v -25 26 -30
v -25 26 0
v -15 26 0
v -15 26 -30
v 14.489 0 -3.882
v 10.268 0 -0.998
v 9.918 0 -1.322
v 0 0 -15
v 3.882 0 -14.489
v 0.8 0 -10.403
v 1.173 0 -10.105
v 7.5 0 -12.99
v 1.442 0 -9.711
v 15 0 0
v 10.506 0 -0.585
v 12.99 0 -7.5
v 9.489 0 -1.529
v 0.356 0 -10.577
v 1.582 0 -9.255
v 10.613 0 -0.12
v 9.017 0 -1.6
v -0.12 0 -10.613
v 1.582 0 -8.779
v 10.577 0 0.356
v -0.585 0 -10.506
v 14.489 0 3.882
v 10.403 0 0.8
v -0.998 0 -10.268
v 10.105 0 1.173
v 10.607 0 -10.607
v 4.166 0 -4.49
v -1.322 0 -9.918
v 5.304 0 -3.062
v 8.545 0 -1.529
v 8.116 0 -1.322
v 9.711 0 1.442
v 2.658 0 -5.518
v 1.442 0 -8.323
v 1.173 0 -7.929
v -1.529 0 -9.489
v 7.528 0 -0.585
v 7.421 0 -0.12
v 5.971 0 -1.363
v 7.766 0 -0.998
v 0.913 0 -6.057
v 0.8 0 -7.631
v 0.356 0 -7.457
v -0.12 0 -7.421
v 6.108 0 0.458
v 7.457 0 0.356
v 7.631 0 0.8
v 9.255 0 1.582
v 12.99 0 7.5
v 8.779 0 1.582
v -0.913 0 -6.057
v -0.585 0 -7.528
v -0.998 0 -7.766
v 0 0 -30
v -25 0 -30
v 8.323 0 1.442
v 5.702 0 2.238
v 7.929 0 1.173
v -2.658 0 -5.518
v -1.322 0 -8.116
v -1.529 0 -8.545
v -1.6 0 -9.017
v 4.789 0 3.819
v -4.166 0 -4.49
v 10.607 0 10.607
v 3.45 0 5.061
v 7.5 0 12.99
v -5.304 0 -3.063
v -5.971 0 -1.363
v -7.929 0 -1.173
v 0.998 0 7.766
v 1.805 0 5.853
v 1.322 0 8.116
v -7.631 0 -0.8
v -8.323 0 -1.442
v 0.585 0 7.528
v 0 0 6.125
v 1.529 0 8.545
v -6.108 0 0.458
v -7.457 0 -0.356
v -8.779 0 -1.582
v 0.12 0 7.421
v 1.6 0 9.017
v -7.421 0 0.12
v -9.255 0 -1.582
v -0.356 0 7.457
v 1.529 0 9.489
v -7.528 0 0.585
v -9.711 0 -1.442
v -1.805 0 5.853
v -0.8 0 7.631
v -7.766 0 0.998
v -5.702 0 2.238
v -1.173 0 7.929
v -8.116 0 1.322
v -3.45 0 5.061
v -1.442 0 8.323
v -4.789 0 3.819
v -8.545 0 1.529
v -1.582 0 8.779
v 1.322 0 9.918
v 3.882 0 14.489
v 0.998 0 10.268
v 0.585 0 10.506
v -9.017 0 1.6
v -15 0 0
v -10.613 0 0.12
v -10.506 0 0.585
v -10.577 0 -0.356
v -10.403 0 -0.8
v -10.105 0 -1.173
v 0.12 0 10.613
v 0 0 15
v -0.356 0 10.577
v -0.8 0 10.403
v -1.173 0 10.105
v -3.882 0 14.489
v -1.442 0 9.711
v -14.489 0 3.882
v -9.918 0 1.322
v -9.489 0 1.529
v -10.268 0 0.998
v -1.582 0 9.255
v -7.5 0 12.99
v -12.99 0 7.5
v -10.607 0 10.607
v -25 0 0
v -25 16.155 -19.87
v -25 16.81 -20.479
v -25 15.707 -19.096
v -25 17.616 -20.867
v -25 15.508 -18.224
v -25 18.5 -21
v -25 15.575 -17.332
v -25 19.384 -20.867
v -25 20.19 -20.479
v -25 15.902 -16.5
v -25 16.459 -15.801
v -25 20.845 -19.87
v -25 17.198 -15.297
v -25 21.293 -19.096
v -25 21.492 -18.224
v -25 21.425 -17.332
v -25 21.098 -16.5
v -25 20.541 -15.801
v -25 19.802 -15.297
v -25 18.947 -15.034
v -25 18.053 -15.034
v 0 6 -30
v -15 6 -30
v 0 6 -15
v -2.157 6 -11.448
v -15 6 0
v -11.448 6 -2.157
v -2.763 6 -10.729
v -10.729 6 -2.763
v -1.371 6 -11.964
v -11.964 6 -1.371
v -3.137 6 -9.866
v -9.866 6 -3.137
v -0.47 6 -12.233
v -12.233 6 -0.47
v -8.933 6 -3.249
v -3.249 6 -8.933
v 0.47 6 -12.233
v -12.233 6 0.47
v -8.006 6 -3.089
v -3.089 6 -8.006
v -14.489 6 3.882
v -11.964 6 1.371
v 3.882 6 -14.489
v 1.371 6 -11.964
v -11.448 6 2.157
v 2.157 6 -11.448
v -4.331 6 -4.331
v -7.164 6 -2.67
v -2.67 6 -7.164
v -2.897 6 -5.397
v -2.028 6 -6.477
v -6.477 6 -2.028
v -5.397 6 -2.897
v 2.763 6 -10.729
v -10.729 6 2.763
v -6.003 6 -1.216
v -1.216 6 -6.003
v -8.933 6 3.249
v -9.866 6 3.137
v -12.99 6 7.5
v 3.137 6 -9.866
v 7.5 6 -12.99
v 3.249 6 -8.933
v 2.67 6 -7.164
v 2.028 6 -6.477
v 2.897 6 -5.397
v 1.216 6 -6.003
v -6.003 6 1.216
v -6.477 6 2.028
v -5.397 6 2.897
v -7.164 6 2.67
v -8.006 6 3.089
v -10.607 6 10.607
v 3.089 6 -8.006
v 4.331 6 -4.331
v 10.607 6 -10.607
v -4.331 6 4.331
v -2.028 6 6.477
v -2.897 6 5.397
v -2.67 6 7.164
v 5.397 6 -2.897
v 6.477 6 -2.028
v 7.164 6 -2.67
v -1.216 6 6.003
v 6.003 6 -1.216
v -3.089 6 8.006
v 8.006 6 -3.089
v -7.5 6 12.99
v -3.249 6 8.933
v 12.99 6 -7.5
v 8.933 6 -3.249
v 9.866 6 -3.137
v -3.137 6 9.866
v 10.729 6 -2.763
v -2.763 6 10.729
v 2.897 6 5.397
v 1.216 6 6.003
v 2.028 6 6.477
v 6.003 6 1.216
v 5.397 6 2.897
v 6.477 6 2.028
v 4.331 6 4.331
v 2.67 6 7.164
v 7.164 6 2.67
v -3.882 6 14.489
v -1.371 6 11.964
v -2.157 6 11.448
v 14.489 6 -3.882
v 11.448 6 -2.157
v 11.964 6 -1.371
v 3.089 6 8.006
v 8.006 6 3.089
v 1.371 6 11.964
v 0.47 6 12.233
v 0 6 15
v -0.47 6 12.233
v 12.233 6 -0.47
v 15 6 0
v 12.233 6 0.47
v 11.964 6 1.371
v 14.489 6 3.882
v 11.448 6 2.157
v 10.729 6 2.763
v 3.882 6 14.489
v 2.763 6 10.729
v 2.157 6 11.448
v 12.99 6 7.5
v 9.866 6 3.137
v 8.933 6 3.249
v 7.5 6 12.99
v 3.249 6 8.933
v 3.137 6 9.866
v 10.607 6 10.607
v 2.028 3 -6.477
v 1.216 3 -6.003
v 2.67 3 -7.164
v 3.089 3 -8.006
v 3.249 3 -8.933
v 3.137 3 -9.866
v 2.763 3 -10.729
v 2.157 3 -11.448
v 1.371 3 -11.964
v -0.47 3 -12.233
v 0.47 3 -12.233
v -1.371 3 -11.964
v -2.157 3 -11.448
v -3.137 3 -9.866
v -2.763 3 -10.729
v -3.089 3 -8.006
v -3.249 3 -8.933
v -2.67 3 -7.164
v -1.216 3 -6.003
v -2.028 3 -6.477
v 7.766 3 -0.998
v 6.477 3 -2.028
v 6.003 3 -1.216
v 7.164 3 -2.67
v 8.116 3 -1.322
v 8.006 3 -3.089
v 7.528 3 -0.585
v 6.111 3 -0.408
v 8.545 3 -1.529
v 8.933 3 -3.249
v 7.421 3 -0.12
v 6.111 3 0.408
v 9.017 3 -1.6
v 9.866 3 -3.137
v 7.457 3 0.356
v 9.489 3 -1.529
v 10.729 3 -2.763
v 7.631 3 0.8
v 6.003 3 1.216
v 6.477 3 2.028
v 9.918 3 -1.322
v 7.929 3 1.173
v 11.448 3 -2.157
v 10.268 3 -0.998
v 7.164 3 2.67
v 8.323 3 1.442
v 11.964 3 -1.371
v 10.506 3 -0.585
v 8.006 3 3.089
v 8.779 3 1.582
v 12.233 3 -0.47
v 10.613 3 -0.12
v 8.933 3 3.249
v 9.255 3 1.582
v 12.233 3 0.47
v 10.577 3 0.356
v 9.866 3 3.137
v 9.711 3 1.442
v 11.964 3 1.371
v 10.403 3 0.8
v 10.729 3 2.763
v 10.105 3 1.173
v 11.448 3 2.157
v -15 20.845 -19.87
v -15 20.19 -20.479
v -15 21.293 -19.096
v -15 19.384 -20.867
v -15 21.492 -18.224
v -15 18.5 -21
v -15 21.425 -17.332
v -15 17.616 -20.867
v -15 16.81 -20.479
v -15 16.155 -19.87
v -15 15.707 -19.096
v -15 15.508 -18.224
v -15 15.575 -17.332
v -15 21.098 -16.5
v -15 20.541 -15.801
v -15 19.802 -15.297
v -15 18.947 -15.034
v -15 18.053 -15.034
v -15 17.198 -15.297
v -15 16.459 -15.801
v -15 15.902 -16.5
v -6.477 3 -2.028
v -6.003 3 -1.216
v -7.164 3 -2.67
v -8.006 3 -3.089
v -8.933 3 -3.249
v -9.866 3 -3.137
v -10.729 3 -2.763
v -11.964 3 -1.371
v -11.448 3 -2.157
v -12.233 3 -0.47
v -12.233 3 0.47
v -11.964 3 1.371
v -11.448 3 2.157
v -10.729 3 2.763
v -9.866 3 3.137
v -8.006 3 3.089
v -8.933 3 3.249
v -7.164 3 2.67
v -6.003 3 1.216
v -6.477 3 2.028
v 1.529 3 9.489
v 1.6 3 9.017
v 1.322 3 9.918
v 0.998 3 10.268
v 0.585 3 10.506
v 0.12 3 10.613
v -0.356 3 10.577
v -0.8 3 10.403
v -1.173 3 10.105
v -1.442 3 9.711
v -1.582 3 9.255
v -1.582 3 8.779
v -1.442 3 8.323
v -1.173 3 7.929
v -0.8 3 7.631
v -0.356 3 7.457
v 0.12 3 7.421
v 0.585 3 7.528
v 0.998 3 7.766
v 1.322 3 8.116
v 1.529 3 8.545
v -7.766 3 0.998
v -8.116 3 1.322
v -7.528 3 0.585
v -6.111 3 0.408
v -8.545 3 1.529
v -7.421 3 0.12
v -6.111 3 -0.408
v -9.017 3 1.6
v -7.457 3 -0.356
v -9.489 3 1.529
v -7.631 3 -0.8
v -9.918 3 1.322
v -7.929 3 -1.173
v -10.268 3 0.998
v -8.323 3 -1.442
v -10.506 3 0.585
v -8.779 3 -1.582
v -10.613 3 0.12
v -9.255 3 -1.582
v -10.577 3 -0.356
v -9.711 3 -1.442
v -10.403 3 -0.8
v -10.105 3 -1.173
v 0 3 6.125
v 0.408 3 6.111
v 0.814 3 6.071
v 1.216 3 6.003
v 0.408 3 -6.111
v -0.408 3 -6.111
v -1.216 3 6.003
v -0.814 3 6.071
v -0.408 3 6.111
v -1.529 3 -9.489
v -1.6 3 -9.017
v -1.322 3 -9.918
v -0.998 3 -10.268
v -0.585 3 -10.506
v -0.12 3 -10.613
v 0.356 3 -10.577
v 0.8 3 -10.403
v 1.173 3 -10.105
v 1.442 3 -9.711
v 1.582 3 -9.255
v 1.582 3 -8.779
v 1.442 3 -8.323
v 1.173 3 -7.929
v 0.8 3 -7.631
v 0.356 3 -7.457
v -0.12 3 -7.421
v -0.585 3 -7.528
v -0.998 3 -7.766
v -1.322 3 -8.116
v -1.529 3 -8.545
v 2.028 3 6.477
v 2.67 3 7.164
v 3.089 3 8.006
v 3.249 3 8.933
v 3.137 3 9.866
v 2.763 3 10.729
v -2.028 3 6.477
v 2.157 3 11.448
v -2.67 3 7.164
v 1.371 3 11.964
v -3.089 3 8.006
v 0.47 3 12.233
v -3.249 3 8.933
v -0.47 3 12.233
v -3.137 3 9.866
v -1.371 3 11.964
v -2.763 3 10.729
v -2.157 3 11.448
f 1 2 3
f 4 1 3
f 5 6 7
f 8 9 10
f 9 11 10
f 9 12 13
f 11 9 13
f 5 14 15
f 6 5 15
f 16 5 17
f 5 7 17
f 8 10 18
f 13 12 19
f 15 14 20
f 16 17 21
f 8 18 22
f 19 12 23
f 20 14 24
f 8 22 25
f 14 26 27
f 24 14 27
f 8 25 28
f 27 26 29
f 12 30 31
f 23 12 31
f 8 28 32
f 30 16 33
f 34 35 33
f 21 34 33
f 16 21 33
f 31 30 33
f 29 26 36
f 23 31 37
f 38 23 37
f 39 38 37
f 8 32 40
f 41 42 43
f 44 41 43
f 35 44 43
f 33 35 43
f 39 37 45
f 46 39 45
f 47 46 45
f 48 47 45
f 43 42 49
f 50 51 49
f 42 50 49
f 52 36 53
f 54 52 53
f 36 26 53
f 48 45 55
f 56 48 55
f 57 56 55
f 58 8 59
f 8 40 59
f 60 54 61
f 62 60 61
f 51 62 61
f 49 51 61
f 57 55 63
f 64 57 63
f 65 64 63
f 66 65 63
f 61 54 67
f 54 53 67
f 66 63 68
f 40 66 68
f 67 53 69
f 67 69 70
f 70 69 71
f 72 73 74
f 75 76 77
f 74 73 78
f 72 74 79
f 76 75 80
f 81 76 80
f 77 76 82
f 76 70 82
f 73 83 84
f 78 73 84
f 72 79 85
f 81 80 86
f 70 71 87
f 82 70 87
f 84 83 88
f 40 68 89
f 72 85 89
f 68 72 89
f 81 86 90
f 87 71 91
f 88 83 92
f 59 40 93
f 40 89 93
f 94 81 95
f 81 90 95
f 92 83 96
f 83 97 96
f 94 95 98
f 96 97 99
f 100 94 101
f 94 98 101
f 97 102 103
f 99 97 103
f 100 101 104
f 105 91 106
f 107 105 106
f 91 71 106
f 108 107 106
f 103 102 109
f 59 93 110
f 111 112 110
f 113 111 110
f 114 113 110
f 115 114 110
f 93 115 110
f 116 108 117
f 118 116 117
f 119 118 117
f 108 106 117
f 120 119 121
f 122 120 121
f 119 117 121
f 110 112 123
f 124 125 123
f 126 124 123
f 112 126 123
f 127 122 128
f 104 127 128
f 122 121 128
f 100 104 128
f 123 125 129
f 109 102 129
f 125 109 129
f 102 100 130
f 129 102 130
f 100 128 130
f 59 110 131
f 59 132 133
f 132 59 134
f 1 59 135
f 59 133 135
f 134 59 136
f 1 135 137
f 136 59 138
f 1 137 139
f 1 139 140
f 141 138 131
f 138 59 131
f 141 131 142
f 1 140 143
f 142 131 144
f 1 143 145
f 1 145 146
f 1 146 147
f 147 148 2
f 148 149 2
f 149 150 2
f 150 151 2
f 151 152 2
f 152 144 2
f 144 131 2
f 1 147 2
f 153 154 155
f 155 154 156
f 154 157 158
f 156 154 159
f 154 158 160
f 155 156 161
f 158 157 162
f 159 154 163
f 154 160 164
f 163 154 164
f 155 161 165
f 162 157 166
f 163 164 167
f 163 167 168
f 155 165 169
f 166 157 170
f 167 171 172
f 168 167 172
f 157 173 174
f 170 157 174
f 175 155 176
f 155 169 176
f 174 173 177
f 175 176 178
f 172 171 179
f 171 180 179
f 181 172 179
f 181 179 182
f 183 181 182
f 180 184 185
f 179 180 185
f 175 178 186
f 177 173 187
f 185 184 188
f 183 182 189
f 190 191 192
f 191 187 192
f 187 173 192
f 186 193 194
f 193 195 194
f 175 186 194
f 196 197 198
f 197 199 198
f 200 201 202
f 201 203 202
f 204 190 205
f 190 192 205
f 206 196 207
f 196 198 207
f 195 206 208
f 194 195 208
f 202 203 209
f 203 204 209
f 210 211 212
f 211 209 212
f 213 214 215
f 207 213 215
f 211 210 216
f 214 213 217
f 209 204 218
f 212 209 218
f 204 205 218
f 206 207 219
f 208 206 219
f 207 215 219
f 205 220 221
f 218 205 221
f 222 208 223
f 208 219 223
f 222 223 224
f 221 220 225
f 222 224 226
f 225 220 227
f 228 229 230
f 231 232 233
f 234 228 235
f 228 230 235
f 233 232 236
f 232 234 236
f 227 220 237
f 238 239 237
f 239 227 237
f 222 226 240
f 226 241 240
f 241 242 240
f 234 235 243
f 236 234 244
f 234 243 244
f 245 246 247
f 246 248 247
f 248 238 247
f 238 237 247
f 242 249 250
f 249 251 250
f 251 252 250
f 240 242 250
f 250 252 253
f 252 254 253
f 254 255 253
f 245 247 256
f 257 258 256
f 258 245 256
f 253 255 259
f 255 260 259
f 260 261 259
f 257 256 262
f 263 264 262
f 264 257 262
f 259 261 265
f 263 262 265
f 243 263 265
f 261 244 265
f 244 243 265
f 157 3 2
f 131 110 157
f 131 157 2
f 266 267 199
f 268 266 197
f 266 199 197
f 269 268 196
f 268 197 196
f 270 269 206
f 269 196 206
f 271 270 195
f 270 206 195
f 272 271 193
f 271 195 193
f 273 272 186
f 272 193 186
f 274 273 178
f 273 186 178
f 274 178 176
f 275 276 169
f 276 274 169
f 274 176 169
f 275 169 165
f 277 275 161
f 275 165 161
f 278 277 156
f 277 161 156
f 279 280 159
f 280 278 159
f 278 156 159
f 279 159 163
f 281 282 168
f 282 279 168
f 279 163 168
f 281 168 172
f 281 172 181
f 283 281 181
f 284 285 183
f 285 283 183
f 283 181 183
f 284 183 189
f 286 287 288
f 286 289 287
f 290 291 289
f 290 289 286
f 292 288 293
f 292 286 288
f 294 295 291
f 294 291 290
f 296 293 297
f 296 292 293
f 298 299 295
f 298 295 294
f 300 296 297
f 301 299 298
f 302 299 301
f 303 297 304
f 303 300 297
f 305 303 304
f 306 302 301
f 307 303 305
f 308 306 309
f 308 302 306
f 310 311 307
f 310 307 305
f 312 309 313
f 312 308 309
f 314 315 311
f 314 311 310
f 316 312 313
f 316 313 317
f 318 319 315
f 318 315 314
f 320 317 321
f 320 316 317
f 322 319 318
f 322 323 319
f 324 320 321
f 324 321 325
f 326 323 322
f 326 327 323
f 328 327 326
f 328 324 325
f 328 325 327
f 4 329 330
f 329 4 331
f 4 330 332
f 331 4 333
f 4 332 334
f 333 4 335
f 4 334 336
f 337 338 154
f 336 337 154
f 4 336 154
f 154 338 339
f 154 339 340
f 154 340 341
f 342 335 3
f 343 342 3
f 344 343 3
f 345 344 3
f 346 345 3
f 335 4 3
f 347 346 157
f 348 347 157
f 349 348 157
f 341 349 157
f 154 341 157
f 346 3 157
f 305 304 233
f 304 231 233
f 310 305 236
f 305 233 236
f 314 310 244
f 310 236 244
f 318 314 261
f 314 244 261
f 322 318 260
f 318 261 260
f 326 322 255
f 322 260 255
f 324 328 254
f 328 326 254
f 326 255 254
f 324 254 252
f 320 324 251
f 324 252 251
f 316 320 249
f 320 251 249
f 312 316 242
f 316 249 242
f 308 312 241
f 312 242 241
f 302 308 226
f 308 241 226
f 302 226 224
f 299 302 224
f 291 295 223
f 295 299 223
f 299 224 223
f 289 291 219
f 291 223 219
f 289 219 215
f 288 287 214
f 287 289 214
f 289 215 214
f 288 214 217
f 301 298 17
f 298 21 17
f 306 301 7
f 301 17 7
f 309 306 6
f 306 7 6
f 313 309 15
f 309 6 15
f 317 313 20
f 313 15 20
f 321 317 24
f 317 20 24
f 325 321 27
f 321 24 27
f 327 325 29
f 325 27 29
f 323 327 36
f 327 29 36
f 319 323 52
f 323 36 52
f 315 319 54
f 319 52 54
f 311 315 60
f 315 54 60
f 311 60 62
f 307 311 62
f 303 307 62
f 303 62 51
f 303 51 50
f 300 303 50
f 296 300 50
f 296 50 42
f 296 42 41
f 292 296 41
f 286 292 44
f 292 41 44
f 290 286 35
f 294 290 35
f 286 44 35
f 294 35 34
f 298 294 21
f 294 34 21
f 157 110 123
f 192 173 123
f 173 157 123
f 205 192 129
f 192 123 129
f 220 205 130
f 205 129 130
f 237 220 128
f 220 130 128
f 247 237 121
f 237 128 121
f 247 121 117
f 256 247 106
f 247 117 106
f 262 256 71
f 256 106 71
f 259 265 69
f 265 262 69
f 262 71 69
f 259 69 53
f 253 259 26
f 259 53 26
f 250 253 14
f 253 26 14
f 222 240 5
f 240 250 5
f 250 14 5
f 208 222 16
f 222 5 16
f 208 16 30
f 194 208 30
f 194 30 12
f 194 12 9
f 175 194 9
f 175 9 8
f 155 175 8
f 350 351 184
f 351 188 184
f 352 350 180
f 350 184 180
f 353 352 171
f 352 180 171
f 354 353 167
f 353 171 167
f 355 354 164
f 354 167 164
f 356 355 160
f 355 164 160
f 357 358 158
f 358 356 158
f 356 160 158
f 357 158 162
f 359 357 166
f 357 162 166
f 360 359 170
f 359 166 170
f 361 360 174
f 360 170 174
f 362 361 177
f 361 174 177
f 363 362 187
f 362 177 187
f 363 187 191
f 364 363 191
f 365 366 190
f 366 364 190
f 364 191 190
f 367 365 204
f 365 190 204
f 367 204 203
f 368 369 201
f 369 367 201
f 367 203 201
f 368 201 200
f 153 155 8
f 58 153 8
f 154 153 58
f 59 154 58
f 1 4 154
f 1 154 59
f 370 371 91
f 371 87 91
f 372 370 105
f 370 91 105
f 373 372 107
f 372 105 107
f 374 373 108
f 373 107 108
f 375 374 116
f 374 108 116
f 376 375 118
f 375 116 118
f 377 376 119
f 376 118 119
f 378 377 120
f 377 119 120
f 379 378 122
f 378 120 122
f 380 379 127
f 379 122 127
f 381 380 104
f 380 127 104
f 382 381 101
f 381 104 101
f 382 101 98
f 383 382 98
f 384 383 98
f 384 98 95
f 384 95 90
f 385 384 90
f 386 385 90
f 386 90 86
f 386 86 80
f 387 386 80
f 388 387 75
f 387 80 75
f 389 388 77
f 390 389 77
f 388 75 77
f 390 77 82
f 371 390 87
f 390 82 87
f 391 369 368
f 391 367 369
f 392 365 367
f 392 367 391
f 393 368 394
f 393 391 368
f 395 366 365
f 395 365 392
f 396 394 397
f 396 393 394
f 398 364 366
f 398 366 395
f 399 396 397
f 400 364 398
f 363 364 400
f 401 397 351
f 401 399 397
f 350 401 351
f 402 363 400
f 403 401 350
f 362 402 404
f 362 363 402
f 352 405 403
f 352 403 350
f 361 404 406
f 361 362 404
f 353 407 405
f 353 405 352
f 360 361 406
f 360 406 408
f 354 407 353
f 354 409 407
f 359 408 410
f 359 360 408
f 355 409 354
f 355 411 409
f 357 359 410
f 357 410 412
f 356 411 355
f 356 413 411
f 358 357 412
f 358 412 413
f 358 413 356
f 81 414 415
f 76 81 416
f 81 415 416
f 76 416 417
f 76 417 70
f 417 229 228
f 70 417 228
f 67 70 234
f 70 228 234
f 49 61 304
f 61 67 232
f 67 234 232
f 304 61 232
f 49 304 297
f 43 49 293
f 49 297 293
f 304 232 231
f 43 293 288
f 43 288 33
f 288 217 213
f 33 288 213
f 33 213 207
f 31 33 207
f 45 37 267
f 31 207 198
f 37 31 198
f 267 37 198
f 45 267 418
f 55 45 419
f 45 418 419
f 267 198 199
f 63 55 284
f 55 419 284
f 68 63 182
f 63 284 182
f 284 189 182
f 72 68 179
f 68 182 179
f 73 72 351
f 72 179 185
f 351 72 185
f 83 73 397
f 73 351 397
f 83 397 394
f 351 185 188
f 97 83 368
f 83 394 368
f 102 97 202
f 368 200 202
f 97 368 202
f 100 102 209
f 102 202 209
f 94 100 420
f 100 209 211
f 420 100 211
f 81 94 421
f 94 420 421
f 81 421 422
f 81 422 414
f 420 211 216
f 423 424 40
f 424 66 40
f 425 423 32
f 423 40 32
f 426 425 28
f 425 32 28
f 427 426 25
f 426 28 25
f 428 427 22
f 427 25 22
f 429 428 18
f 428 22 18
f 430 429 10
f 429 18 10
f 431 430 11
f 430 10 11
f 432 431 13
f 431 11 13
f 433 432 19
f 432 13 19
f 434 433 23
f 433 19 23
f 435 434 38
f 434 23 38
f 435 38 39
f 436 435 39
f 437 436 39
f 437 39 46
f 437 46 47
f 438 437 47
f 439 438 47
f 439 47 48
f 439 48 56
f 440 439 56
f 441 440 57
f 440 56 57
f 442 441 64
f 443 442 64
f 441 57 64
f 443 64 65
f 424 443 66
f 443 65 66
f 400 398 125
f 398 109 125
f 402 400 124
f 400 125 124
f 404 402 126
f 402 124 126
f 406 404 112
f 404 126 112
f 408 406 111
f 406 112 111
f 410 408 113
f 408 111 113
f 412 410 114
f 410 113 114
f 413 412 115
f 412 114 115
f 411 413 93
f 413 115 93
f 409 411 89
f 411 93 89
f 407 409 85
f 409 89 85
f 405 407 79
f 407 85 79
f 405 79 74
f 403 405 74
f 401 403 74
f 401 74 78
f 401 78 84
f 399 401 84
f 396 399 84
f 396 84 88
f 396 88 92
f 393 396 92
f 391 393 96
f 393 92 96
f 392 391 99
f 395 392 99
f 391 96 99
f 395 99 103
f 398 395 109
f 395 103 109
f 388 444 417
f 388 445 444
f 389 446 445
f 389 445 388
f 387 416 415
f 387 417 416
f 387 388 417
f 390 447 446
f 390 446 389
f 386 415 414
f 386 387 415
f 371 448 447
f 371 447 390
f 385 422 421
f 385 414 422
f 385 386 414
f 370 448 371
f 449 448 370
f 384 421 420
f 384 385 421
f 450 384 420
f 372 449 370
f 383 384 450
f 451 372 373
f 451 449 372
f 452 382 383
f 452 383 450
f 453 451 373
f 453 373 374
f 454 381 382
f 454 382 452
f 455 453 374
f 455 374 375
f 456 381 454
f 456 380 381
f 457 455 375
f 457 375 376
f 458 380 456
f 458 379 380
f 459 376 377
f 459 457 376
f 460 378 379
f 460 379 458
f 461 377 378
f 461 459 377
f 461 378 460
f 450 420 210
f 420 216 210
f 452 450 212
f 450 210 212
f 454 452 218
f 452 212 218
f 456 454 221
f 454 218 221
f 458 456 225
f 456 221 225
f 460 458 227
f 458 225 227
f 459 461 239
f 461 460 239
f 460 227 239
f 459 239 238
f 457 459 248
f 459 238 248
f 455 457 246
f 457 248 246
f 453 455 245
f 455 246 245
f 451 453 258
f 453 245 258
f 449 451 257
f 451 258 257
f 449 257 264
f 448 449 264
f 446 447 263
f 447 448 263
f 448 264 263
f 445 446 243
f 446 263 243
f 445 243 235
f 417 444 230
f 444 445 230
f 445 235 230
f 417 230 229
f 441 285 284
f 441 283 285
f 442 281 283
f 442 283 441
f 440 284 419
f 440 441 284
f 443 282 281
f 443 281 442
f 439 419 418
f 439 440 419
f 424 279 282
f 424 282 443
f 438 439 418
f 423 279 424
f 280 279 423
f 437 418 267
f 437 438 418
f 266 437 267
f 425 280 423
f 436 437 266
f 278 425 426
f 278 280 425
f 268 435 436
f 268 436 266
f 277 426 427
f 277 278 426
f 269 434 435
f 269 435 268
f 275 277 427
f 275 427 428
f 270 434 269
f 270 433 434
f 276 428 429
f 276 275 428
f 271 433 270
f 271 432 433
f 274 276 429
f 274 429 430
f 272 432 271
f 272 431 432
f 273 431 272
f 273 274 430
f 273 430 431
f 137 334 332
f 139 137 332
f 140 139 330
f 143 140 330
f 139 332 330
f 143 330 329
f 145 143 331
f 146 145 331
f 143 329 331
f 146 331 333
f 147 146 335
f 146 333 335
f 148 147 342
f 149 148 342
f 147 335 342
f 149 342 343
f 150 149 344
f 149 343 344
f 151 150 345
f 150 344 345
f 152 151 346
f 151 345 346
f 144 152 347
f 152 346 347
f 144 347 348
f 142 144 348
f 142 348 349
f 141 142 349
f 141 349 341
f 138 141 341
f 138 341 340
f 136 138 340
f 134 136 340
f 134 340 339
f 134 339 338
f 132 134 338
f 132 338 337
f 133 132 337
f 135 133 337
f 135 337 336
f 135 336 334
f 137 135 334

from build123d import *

# Parameters (mm, degrees)
SKETCH1_R                       = 15
BOSS_EXTRUDE1_DEPTH             = 6
CUT_EXTRUDE1_REACH              = 24.045
SKETCH2_R                       = 6.125
CBORE_FOR_M3_SHCS2_D            = 3.2
CBORE_FOR_M3_SHCS2_CBORE_D      = 6.5
CBORE_FOR_M3_SHCS2_CBORE_DEPTH  = 3
CIRPATTERN1_COUNT               = 4
BOSS_EXTRUDE2_REACH             = 24.045
BOSS_EXTRUDE2_DIRECTION_2_DEPTH = 20
CUT_EXTRUDE2_START              = -25
SKETCH7_W                       = 15
SKETCH7_H                       = 20
CUT_EXTRUDE2_DEPTH              = 15
BOSS_EXTRUDE3_DEPTH             = 15
CUT_EXTRUDE3_REACH              = 51.759
SKETCH8_R                       = 3


with BuildPart() as part:
    # Sketch1 → Boss-Extrude1 (new body)
    with BuildSketch(Plane(origin=(0, 0, 0), x_dir=(1, 0, 0), z_dir=(0, 1, 0))):
        with Locations(Location((0, 0, 0), (0, 0, 270))):
            Circle(SKETCH1_R)
    extrude(amount=BOSS_EXTRUDE1_DEPTH)

    # Sketch2 → Cut-Extrude1 (cut, up to next)
    with BuildSketch(Plane(origin=(0, 6, 0), x_dir=(1, 0, 0), z_dir=(0, 1, 0)), mode=Mode.PRIVATE) as cut_extrude1_sk1:
        with Locations(Location((0, 0, 0), (0, 0, 270))):
            Circle(SKETCH2_R)
    cut_extrude1_tool1 = extrude(cut_extrude1_sk1.sketch, amount=-CUT_EXTRUDE1_REACH, mode=Mode.PRIVATE) & part.part
    add(cut_extrude1_tool1.solids().sort_by_distance((0, 6, 0))[0], mode=Mode.SUBTRACT)

    # CBORE for M3 SHCS2 (through all)
    with Locations(Plane(origin=(0, 6, 0), x_dir=(1, 0, 0), z_dir=(0, 1, 0))):
        with Locations((0, 9.017)):
            cbore_for_m3_shcs2 = CounterBoreHole(CBORE_FOR_M3_SHCS2_D / 2, CBORE_FOR_M3_SHCS2_CBORE_D / 2, CBORE_FOR_M3_SHCS2_CBORE_DEPTH)

    # CirPattern1: CBORE for M3 SHCS2 ×4 about axis
    cirpattern1_axis = Axis((0, 0, 0), (0, 1, 0))
    for i in range(1, CIRPATTERN1_COUNT):
        add(cbore_for_m3_shcs2.rotate(cirpattern1_axis, i * 360 / CIRPATTERN1_COUNT), mode=Mode.SUBTRACT)

    # Boss-Extrude2: up to this face of the body (flat: up to its plane)
    boss_extrude2_end = Plane(part.part.faces().sort_by_distance((0, 0, -14.575735931))[0])
    # Sketch6 → Boss-Extrude2 (add, up to the picked face)
    with BuildSketch(Plane(origin=(0, 6, 0), x_dir=(1, 0, 0), z_dir=(0, 1, 0)), mode=Mode.PRIVATE) as boss_extrude2_sk1:
        with BuildLine():
            Line((-25, 0), (-25, 15))
            Line((-25, 15), (0, 15))
            ThreePointArc((0, 15), (-10.606601718, 10.606601718), (-15, 0))
            Line((-15, 0), (-25, 0))
        make_face()
    boss_extrude2_tool1 = split(extrude(boss_extrude2_sk1.sketch, amount=-BOSS_EXTRUDE2_REACH, mode=Mode.PRIVATE), bisect_by=boss_extrude2_end, keep=Keep.BOTH, mode=Mode.PRIVATE)
    add(boss_extrude2_tool1.solids().sort_by(Axis((-17.966526, 6, -8.51046), (0, -1, 0)))[0])

    # Sketch6 → Boss-Extrude2 direction 2 (add)
    with BuildSketch(Plane(origin=(0, 6, 0), x_dir=(1, 0, 0), z_dir=(0, 1, 0))):
        with BuildLine():
            Line((-25, 0), (-25, 15))
            Line((-25, 15), (0, 15))
            ThreePointArc((0, 15), (-10.606601718, 10.606601718), (-15, 0))
            Line((-15, 0), (-25, 0))
        make_face()
    extrude(amount=BOSS_EXTRUDE2_DIRECTION_2_DEPTH)

    # Sketch7 → Cut-Extrude2 (cut)
    with BuildSketch(Plane.ZY.offset(25).offset(CUT_EXTRUDE2_START)):
        with Locations((-7.5, 16)):
            Rectangle(SKETCH7_W, SKETCH7_H)
    extrude(amount=CUT_EXTRUDE2_DEPTH, mode=Mode.SUBTRACT)

    # Sketch9 → Boss-Extrude3 (add)
    with BuildSketch(Plane(origin=(0, 0, -15), x_dir=(-1, 0, 0), z_dir=(0, 0, -1))):
        Polygon((15, 26), (15, 6), (0, 6), (0, 0), (25, 0), (25, 26), align=None)
    extrude(amount=BOSS_EXTRUDE3_DEPTH)

    # Sketch8 → Cut-Extrude3 (cut, up to next)
    with BuildSketch(Plane(origin=(-15, 0, 0), x_dir=(0, 0, -1), z_dir=(1, 0, 0)), mode=Mode.PRIVATE) as cut_extrude3_sk1:
        with Locations((18, 18.5)):
            Circle(SKETCH8_R)
    cut_extrude3_tool1 = extrude(cut_extrude3_sk1.sketch, amount=-CUT_EXTRUDE3_REACH, mode=Mode.PRIVATE) & part.part
    add(cut_extrude3_tool1.solids().sort_by_distance((-15, 18.5, -18))[0], mode=Mode.SUBTRACT)


solid = part.part
